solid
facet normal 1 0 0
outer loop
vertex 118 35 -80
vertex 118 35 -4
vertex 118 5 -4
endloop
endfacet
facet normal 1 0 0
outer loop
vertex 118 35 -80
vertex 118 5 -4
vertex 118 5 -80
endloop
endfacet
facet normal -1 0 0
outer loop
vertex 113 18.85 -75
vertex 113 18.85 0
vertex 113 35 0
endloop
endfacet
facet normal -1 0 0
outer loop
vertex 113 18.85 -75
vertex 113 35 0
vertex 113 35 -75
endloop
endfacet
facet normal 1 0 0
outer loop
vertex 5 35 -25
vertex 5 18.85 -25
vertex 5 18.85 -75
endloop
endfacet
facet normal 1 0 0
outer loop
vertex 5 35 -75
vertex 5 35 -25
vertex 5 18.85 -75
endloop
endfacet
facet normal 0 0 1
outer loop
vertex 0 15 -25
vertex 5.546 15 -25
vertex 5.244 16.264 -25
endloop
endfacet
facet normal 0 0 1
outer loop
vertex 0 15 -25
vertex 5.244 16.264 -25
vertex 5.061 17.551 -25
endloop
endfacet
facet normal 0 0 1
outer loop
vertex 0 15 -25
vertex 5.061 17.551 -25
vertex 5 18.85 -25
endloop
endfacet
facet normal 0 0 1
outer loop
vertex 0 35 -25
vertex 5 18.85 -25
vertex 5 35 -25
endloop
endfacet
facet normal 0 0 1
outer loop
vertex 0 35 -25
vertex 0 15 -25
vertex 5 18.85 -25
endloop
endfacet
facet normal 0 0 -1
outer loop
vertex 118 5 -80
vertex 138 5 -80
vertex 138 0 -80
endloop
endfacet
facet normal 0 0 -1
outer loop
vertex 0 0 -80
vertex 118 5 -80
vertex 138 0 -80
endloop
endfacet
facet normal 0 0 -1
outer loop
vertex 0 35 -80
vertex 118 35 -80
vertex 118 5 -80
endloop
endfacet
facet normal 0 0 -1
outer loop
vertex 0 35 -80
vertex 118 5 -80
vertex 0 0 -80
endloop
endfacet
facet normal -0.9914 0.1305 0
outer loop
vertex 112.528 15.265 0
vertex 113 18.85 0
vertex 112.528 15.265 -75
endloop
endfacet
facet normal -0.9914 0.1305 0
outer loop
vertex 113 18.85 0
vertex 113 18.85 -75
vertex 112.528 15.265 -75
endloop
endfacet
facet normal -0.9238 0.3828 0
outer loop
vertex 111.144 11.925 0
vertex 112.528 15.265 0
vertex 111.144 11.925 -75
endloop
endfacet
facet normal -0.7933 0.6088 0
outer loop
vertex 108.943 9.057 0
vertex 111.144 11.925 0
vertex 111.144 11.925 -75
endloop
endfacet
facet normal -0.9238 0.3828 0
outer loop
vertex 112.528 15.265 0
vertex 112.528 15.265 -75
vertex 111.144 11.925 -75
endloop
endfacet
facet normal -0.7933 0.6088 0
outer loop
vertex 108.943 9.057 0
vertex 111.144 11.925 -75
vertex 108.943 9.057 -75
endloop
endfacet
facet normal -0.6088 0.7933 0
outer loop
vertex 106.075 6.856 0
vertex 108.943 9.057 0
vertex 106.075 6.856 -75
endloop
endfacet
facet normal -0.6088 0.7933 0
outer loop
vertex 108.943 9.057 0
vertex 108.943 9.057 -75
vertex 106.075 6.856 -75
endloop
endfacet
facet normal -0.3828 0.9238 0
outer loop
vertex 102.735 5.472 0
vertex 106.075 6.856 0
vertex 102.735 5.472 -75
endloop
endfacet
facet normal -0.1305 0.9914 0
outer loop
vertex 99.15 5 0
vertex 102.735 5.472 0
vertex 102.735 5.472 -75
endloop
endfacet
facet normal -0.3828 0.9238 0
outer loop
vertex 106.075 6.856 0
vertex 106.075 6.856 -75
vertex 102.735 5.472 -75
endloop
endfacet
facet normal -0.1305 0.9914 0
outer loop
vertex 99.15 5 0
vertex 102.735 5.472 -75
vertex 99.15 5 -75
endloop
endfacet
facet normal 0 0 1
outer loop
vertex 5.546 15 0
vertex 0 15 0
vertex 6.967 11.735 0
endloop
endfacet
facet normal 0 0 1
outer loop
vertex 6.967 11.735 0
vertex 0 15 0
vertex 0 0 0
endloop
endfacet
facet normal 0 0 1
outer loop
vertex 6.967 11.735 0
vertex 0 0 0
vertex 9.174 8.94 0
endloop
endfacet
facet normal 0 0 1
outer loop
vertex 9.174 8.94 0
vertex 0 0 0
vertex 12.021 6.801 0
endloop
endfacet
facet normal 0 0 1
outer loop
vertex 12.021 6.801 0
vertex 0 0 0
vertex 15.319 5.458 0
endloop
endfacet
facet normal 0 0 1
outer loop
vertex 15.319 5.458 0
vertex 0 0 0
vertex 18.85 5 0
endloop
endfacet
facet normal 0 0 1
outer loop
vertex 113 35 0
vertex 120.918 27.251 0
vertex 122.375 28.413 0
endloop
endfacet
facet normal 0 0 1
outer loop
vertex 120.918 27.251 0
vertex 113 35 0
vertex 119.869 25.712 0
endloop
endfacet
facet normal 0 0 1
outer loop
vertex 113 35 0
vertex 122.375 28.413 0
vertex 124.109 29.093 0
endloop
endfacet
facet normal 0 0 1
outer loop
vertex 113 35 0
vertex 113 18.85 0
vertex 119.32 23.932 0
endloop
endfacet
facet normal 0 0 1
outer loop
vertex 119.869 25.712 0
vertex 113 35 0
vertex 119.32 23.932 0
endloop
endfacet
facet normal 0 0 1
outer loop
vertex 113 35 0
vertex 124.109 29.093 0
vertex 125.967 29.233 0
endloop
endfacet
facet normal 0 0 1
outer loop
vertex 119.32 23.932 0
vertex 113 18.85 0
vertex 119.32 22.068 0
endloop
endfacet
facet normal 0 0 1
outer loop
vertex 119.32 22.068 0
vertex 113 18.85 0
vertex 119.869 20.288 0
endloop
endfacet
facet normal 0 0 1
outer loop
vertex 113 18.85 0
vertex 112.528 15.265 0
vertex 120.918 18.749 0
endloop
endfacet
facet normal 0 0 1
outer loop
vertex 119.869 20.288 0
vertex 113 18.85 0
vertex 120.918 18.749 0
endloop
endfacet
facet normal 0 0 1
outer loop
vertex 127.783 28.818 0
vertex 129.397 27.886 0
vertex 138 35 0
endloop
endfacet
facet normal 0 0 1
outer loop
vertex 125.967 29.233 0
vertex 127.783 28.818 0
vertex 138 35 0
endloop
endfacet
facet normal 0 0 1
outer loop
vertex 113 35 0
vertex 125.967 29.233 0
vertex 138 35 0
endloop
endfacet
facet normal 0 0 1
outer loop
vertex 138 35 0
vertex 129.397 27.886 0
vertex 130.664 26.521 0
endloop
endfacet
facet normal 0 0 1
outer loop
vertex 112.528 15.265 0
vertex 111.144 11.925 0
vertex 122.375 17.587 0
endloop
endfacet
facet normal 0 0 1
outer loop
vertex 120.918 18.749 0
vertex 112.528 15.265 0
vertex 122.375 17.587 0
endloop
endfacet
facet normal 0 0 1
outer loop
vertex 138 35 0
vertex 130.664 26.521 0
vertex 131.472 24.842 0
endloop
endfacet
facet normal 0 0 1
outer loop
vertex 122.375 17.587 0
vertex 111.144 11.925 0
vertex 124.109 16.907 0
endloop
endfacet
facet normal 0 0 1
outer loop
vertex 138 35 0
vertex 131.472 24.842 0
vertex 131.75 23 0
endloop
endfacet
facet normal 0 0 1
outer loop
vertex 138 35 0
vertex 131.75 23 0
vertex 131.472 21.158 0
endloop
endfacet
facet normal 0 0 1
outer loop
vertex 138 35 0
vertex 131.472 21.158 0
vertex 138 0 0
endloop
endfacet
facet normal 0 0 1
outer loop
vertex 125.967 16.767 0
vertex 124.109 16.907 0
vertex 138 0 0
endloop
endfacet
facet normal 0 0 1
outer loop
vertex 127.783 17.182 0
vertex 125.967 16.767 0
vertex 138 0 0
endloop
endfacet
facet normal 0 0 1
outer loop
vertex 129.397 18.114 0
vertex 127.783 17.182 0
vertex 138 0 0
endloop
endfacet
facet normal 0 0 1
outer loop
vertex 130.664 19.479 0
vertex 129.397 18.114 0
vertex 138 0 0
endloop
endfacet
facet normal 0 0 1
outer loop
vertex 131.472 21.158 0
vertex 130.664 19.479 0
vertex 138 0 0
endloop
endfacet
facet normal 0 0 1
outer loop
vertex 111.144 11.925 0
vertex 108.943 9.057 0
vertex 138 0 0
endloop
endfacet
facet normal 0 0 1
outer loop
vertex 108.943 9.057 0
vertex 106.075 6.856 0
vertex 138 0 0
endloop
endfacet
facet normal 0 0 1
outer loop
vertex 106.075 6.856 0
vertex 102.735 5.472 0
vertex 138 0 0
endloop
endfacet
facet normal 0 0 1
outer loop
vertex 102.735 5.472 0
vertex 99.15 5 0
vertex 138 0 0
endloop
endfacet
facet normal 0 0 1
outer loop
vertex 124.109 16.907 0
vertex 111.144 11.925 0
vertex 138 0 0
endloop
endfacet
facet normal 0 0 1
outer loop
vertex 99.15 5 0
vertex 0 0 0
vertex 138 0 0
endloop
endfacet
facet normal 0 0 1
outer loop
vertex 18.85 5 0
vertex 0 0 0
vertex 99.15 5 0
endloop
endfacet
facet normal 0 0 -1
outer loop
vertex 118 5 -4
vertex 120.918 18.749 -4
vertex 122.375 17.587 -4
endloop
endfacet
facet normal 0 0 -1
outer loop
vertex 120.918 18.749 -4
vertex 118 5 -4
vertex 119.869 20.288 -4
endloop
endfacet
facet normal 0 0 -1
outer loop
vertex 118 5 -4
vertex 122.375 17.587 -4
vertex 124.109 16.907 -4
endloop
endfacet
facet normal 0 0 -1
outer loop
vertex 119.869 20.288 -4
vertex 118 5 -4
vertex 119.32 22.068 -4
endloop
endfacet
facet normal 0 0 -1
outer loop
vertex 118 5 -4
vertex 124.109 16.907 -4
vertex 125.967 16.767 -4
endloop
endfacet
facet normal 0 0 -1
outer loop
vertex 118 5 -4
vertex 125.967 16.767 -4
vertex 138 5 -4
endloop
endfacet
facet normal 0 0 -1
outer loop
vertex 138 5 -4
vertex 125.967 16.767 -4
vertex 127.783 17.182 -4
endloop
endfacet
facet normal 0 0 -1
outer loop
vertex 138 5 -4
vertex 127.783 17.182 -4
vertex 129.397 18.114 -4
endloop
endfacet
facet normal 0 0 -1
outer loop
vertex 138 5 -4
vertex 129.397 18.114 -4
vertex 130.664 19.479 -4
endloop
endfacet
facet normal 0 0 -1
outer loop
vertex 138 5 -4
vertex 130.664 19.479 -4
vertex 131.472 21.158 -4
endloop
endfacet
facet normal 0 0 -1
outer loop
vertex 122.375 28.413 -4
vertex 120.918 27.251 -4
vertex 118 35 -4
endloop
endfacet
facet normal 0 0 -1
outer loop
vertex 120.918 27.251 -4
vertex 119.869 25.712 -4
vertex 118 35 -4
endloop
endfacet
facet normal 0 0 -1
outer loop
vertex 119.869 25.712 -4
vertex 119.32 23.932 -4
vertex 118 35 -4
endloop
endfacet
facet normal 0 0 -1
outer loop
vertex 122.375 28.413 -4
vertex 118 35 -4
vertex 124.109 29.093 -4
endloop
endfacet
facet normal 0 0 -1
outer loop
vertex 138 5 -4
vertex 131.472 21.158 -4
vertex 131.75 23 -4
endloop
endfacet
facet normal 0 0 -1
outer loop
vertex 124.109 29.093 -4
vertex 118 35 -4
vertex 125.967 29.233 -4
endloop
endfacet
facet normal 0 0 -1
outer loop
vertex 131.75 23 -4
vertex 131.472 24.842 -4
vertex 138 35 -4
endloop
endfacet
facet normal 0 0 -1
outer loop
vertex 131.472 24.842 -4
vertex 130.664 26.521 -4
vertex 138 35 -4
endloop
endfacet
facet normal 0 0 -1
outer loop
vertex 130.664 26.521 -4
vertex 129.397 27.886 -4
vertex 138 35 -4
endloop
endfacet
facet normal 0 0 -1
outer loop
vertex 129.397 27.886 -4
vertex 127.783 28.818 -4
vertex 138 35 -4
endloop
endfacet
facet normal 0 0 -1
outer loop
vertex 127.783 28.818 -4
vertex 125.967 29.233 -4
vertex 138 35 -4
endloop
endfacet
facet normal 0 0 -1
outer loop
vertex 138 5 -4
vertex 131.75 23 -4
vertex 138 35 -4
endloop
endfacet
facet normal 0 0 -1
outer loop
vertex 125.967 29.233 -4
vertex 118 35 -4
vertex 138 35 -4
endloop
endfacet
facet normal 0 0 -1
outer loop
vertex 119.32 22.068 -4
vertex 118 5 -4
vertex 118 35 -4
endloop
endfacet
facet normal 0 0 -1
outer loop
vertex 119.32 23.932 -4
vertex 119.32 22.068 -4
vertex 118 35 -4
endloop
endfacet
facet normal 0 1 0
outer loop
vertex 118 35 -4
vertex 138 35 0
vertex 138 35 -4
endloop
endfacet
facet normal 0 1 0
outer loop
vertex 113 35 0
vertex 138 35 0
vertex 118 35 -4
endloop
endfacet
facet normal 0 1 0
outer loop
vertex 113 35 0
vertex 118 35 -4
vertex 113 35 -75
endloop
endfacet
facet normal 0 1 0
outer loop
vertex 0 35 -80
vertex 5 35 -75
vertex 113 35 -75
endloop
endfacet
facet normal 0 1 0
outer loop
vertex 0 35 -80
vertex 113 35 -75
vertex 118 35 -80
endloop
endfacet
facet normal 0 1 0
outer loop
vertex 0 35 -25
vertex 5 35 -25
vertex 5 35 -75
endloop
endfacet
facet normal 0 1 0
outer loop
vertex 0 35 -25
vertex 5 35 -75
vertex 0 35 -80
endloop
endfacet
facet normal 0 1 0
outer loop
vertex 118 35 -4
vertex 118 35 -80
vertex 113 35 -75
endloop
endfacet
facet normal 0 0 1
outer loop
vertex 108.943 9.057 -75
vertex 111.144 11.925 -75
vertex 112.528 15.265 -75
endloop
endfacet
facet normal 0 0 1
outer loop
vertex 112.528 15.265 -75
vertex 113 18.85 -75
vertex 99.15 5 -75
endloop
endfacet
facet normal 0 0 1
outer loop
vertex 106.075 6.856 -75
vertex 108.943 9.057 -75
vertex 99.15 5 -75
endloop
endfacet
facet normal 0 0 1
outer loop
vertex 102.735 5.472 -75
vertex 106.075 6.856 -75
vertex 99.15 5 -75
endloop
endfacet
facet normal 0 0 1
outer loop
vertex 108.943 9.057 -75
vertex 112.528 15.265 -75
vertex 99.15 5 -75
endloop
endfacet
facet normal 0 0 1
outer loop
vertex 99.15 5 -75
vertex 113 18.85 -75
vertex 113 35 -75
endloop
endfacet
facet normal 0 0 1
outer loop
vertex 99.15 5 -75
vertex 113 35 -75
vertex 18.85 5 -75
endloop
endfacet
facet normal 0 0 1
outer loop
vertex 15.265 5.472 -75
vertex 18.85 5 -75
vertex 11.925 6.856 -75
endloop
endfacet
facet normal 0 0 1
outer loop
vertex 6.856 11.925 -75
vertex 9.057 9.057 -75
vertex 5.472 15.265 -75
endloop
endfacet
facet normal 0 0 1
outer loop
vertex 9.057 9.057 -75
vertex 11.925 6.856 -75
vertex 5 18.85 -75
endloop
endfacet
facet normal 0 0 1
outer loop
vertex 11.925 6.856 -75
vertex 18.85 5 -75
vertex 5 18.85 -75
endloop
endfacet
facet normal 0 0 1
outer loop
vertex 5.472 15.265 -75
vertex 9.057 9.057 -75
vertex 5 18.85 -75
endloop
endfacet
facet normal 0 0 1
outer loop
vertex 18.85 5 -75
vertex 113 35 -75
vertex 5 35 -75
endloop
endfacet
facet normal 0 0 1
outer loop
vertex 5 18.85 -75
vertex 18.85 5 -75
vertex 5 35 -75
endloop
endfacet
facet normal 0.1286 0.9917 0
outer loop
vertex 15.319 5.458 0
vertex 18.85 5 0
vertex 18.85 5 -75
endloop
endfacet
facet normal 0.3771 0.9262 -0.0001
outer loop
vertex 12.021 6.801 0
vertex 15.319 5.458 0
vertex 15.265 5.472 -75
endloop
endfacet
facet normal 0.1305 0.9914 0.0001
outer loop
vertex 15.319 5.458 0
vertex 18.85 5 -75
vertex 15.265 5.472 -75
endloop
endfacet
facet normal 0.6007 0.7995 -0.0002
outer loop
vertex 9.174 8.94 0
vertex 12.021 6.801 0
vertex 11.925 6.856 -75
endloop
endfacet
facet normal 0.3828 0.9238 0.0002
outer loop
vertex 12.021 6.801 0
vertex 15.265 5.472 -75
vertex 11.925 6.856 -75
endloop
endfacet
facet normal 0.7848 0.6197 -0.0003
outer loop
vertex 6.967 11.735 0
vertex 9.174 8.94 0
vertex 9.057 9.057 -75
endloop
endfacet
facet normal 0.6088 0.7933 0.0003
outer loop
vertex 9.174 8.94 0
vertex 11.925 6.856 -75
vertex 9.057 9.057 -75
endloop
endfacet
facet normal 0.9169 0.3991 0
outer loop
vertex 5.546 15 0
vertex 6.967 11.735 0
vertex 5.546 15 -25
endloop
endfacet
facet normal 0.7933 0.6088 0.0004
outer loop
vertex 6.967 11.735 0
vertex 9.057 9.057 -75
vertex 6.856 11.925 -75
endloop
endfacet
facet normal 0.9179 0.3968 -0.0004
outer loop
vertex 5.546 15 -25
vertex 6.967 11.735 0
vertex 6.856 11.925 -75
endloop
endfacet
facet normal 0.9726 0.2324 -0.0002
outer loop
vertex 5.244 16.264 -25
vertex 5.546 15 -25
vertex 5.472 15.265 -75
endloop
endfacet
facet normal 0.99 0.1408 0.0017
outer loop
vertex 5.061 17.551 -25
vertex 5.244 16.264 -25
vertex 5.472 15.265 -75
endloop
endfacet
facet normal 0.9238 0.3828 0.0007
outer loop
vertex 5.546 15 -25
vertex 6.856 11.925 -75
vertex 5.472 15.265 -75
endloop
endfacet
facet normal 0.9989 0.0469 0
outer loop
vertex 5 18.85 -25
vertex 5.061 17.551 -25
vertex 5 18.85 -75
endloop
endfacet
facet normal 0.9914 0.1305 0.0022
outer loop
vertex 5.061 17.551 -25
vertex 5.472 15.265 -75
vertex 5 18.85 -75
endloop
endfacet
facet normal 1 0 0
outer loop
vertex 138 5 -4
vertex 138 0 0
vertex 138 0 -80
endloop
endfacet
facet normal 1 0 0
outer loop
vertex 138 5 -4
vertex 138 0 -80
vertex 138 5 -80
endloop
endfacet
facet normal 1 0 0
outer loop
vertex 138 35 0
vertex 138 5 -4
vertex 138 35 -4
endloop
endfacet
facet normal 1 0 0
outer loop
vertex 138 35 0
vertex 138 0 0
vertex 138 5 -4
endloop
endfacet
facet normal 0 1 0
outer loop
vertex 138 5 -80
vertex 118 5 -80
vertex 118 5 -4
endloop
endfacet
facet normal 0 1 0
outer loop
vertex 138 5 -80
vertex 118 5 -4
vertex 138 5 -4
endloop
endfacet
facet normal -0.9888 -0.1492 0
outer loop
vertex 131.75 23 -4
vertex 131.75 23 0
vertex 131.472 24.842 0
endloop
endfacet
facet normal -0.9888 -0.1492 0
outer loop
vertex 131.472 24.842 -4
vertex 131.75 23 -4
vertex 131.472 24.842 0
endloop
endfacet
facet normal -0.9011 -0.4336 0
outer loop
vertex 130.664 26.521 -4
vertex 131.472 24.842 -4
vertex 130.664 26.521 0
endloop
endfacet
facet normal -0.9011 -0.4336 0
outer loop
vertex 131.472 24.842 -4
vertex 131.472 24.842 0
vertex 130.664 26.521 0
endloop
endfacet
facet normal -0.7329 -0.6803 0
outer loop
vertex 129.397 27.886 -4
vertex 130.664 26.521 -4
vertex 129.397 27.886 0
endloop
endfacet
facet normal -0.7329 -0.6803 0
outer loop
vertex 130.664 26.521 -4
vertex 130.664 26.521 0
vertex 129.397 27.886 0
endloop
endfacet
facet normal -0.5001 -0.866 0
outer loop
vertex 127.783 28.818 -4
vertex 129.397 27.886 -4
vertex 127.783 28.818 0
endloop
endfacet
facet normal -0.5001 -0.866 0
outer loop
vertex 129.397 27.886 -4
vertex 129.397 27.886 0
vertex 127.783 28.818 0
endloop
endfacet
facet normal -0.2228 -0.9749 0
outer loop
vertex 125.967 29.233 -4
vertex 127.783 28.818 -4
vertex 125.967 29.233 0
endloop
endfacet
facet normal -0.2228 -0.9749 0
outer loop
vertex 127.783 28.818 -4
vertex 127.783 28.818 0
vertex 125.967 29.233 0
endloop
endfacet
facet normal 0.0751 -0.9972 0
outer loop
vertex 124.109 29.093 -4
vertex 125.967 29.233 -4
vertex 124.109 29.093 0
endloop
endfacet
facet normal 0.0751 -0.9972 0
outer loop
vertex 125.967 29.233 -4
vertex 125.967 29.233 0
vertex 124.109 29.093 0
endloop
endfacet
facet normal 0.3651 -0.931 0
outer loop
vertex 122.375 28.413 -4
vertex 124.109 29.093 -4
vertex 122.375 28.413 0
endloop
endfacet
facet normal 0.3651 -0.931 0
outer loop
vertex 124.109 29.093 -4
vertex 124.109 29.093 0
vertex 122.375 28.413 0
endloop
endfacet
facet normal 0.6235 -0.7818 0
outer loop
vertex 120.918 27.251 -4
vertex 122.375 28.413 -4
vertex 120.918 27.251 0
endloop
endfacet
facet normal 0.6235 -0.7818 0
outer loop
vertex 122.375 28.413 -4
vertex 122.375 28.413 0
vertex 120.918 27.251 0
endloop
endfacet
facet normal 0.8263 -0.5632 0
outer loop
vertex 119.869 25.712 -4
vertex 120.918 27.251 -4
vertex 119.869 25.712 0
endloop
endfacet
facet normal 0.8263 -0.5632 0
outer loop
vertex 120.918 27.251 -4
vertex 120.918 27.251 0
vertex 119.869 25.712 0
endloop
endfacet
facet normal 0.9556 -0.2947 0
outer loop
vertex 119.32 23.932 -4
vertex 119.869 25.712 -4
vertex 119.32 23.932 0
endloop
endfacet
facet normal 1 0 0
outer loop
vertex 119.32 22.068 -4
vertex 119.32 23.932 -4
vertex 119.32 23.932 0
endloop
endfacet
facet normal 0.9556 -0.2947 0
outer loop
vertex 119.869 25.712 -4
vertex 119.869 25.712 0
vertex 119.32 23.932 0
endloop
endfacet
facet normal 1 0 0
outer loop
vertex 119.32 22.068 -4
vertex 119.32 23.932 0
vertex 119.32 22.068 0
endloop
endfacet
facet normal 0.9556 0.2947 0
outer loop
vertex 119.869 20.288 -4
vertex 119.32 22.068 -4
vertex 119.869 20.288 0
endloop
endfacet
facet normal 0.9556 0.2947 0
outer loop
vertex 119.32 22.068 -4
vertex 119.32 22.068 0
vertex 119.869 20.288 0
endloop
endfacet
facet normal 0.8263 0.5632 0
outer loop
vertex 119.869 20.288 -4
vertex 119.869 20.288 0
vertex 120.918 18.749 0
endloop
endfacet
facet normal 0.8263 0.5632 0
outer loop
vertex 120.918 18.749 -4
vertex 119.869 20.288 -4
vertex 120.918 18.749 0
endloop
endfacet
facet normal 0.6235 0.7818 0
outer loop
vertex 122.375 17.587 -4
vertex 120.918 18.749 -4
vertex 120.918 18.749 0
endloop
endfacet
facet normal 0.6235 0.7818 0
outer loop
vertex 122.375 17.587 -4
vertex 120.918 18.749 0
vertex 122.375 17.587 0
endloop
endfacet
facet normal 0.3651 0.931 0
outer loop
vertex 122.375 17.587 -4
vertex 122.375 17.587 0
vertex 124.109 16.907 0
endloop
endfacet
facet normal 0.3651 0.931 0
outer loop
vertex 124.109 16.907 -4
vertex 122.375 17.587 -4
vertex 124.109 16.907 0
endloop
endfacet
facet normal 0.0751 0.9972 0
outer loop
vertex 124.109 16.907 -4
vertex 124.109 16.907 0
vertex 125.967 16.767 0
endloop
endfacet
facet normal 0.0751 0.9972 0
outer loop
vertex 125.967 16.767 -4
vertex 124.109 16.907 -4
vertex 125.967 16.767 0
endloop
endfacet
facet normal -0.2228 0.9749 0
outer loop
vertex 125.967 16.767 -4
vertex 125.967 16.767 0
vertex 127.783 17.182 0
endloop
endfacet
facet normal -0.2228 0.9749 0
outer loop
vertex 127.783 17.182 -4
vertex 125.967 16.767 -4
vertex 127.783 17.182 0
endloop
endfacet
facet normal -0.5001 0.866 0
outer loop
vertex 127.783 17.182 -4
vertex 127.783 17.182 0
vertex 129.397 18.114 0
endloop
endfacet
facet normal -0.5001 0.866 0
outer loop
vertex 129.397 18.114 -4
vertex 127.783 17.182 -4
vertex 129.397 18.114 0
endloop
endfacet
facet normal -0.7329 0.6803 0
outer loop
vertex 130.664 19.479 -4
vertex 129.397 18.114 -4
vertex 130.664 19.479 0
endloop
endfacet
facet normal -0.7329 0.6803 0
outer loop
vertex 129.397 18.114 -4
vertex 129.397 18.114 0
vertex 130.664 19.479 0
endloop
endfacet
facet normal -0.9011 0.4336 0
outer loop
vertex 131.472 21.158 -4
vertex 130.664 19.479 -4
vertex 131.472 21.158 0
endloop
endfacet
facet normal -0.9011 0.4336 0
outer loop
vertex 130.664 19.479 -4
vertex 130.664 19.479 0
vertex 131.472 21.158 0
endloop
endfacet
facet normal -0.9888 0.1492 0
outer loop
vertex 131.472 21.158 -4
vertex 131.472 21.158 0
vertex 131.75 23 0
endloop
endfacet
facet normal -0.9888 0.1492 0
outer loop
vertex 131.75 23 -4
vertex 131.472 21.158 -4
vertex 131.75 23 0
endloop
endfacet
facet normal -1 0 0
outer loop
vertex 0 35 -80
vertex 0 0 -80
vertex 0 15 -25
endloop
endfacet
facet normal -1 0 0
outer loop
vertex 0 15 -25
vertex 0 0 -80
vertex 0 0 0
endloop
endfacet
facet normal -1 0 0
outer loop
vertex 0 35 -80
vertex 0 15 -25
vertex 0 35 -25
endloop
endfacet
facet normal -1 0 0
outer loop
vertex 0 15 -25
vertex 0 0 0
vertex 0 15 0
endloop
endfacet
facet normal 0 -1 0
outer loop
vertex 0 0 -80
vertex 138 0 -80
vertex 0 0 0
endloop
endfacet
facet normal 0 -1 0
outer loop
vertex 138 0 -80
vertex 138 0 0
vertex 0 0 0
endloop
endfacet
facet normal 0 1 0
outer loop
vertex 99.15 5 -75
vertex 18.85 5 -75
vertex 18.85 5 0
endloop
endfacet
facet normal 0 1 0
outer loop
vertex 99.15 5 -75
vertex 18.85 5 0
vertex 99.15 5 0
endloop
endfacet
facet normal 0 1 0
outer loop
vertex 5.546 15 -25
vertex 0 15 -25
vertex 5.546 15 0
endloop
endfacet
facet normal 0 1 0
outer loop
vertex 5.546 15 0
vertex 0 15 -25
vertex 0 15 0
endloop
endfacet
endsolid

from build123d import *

# Parameters (mm, degrees)
ESQUISSE1_W             = 138
ESQUISSE1_H             = 75
BOSS_EXTRU_1_DEPTH      = 5
ESQUISSE2_W             = 5
ESQUISSE2_H             = 75
ESQUISSE2_W_2           = 25
BOSS_EXTRU_2_DEPTH      = 30
CONG_1_R                = 13.85
ESQUISSE3_W             = 138
ESQUISSE3_H             = 35
BOSS_EXTRU_3_DEPTH      = 5
ESQUISSE4_W             = 25
ESQUISSE4_H             = 20
ENL_V_MAT_EXTRU_1_DEPTH = 6
ESQUISSE5_W             = 20
ESQUISSE5_H             = 76
ENL_V_MAT_EXTRU_2_DEPTH = 30
ESQUISSE6_R             = 6.25
ENL_V_MAT_EXTRU_3_DEPTH = 4


with BuildPart() as part:
    # Esquisse1 → Boss.-Extru.1 (new body)
    with BuildSketch(Plane(origin=(0, 0, 0), x_dir=(1, 0, 0), z_dir=(0, 1, 0))):
        with Locations((69, 37.5)):
            Rectangle(ESQUISSE1_W, ESQUISSE1_H)
    extrude(amount=BOSS_EXTRU_1_DEPTH)

    # Esquisse2 → Boss.-Extru.2 (add)
    with BuildSketch(Plane(origin=(0, 5, 0), x_dir=(1, 0, 0), z_dir=(0, 1, 0))):
        with Locations((2.5, 37.5)):
            Rectangle(ESQUISSE2_W, ESQUISSE2_H)
        with Locations((125.5, 37.5)):
            Rectangle(ESQUISSE2_W_2, ESQUISSE2_H)
    extrude(amount=BOSS_EXTRU_2_DEPTH)

    # Congé1
    cong_1_edges = [part.edges().sort_by_distance(p)[0] for p in [
        (5, 5, -37.5),
        (113, 5, -37.5),
    ]]
    fillet(cong_1_edges, radius=CONG_1_R)

    # Esquisse3 → Boss.-Extru.3 (add)
    with BuildSketch(Plane(origin=(0, 0, -75), x_dir=(-1, 0, 0), z_dir=(0, 0, -1))):
        with Locations((-69, 17.5)):
            Rectangle(ESQUISSE3_W, ESQUISSE3_H)
    extrude(amount=BOSS_EXTRU_3_DEPTH)

    # Esquisse4 → Enlèv. mat.-Extru.1 (cut)
    with BuildSketch(Plane.ZY):
        with Locations((-12.5, 25)):
            Rectangle(ESQUISSE4_W, ESQUISSE4_H)
    extrude(amount=-ENL_V_MAT_EXTRU_1_DEPTH, mode=Mode.SUBTRACT)

    # Esquisse5 → Enlèv. mat.-Extru.2 (cut)
    with BuildSketch(Plane(origin=(0, 35, 0), x_dir=(1, 0, 0), z_dir=(0, 1, 0))):
        with Locations((128, 42)):
            Rectangle(ESQUISSE5_W, ESQUISSE5_H)
    extrude(amount=-ENL_V_MAT_EXTRU_2_DEPTH, mode=Mode.SUBTRACT)

    # Esquisse6 → Enlèv. mat.-Extru.3 (cut)
    with BuildSketch(Plane.XY):
        with Locations((125.5, 23)):
            Circle(ESQUISSE6_R)
    extrude(amount=-ENL_V_MAT_EXTRU_3_DEPTH, mode=Mode.SUBTRACT)


solid = part.part
